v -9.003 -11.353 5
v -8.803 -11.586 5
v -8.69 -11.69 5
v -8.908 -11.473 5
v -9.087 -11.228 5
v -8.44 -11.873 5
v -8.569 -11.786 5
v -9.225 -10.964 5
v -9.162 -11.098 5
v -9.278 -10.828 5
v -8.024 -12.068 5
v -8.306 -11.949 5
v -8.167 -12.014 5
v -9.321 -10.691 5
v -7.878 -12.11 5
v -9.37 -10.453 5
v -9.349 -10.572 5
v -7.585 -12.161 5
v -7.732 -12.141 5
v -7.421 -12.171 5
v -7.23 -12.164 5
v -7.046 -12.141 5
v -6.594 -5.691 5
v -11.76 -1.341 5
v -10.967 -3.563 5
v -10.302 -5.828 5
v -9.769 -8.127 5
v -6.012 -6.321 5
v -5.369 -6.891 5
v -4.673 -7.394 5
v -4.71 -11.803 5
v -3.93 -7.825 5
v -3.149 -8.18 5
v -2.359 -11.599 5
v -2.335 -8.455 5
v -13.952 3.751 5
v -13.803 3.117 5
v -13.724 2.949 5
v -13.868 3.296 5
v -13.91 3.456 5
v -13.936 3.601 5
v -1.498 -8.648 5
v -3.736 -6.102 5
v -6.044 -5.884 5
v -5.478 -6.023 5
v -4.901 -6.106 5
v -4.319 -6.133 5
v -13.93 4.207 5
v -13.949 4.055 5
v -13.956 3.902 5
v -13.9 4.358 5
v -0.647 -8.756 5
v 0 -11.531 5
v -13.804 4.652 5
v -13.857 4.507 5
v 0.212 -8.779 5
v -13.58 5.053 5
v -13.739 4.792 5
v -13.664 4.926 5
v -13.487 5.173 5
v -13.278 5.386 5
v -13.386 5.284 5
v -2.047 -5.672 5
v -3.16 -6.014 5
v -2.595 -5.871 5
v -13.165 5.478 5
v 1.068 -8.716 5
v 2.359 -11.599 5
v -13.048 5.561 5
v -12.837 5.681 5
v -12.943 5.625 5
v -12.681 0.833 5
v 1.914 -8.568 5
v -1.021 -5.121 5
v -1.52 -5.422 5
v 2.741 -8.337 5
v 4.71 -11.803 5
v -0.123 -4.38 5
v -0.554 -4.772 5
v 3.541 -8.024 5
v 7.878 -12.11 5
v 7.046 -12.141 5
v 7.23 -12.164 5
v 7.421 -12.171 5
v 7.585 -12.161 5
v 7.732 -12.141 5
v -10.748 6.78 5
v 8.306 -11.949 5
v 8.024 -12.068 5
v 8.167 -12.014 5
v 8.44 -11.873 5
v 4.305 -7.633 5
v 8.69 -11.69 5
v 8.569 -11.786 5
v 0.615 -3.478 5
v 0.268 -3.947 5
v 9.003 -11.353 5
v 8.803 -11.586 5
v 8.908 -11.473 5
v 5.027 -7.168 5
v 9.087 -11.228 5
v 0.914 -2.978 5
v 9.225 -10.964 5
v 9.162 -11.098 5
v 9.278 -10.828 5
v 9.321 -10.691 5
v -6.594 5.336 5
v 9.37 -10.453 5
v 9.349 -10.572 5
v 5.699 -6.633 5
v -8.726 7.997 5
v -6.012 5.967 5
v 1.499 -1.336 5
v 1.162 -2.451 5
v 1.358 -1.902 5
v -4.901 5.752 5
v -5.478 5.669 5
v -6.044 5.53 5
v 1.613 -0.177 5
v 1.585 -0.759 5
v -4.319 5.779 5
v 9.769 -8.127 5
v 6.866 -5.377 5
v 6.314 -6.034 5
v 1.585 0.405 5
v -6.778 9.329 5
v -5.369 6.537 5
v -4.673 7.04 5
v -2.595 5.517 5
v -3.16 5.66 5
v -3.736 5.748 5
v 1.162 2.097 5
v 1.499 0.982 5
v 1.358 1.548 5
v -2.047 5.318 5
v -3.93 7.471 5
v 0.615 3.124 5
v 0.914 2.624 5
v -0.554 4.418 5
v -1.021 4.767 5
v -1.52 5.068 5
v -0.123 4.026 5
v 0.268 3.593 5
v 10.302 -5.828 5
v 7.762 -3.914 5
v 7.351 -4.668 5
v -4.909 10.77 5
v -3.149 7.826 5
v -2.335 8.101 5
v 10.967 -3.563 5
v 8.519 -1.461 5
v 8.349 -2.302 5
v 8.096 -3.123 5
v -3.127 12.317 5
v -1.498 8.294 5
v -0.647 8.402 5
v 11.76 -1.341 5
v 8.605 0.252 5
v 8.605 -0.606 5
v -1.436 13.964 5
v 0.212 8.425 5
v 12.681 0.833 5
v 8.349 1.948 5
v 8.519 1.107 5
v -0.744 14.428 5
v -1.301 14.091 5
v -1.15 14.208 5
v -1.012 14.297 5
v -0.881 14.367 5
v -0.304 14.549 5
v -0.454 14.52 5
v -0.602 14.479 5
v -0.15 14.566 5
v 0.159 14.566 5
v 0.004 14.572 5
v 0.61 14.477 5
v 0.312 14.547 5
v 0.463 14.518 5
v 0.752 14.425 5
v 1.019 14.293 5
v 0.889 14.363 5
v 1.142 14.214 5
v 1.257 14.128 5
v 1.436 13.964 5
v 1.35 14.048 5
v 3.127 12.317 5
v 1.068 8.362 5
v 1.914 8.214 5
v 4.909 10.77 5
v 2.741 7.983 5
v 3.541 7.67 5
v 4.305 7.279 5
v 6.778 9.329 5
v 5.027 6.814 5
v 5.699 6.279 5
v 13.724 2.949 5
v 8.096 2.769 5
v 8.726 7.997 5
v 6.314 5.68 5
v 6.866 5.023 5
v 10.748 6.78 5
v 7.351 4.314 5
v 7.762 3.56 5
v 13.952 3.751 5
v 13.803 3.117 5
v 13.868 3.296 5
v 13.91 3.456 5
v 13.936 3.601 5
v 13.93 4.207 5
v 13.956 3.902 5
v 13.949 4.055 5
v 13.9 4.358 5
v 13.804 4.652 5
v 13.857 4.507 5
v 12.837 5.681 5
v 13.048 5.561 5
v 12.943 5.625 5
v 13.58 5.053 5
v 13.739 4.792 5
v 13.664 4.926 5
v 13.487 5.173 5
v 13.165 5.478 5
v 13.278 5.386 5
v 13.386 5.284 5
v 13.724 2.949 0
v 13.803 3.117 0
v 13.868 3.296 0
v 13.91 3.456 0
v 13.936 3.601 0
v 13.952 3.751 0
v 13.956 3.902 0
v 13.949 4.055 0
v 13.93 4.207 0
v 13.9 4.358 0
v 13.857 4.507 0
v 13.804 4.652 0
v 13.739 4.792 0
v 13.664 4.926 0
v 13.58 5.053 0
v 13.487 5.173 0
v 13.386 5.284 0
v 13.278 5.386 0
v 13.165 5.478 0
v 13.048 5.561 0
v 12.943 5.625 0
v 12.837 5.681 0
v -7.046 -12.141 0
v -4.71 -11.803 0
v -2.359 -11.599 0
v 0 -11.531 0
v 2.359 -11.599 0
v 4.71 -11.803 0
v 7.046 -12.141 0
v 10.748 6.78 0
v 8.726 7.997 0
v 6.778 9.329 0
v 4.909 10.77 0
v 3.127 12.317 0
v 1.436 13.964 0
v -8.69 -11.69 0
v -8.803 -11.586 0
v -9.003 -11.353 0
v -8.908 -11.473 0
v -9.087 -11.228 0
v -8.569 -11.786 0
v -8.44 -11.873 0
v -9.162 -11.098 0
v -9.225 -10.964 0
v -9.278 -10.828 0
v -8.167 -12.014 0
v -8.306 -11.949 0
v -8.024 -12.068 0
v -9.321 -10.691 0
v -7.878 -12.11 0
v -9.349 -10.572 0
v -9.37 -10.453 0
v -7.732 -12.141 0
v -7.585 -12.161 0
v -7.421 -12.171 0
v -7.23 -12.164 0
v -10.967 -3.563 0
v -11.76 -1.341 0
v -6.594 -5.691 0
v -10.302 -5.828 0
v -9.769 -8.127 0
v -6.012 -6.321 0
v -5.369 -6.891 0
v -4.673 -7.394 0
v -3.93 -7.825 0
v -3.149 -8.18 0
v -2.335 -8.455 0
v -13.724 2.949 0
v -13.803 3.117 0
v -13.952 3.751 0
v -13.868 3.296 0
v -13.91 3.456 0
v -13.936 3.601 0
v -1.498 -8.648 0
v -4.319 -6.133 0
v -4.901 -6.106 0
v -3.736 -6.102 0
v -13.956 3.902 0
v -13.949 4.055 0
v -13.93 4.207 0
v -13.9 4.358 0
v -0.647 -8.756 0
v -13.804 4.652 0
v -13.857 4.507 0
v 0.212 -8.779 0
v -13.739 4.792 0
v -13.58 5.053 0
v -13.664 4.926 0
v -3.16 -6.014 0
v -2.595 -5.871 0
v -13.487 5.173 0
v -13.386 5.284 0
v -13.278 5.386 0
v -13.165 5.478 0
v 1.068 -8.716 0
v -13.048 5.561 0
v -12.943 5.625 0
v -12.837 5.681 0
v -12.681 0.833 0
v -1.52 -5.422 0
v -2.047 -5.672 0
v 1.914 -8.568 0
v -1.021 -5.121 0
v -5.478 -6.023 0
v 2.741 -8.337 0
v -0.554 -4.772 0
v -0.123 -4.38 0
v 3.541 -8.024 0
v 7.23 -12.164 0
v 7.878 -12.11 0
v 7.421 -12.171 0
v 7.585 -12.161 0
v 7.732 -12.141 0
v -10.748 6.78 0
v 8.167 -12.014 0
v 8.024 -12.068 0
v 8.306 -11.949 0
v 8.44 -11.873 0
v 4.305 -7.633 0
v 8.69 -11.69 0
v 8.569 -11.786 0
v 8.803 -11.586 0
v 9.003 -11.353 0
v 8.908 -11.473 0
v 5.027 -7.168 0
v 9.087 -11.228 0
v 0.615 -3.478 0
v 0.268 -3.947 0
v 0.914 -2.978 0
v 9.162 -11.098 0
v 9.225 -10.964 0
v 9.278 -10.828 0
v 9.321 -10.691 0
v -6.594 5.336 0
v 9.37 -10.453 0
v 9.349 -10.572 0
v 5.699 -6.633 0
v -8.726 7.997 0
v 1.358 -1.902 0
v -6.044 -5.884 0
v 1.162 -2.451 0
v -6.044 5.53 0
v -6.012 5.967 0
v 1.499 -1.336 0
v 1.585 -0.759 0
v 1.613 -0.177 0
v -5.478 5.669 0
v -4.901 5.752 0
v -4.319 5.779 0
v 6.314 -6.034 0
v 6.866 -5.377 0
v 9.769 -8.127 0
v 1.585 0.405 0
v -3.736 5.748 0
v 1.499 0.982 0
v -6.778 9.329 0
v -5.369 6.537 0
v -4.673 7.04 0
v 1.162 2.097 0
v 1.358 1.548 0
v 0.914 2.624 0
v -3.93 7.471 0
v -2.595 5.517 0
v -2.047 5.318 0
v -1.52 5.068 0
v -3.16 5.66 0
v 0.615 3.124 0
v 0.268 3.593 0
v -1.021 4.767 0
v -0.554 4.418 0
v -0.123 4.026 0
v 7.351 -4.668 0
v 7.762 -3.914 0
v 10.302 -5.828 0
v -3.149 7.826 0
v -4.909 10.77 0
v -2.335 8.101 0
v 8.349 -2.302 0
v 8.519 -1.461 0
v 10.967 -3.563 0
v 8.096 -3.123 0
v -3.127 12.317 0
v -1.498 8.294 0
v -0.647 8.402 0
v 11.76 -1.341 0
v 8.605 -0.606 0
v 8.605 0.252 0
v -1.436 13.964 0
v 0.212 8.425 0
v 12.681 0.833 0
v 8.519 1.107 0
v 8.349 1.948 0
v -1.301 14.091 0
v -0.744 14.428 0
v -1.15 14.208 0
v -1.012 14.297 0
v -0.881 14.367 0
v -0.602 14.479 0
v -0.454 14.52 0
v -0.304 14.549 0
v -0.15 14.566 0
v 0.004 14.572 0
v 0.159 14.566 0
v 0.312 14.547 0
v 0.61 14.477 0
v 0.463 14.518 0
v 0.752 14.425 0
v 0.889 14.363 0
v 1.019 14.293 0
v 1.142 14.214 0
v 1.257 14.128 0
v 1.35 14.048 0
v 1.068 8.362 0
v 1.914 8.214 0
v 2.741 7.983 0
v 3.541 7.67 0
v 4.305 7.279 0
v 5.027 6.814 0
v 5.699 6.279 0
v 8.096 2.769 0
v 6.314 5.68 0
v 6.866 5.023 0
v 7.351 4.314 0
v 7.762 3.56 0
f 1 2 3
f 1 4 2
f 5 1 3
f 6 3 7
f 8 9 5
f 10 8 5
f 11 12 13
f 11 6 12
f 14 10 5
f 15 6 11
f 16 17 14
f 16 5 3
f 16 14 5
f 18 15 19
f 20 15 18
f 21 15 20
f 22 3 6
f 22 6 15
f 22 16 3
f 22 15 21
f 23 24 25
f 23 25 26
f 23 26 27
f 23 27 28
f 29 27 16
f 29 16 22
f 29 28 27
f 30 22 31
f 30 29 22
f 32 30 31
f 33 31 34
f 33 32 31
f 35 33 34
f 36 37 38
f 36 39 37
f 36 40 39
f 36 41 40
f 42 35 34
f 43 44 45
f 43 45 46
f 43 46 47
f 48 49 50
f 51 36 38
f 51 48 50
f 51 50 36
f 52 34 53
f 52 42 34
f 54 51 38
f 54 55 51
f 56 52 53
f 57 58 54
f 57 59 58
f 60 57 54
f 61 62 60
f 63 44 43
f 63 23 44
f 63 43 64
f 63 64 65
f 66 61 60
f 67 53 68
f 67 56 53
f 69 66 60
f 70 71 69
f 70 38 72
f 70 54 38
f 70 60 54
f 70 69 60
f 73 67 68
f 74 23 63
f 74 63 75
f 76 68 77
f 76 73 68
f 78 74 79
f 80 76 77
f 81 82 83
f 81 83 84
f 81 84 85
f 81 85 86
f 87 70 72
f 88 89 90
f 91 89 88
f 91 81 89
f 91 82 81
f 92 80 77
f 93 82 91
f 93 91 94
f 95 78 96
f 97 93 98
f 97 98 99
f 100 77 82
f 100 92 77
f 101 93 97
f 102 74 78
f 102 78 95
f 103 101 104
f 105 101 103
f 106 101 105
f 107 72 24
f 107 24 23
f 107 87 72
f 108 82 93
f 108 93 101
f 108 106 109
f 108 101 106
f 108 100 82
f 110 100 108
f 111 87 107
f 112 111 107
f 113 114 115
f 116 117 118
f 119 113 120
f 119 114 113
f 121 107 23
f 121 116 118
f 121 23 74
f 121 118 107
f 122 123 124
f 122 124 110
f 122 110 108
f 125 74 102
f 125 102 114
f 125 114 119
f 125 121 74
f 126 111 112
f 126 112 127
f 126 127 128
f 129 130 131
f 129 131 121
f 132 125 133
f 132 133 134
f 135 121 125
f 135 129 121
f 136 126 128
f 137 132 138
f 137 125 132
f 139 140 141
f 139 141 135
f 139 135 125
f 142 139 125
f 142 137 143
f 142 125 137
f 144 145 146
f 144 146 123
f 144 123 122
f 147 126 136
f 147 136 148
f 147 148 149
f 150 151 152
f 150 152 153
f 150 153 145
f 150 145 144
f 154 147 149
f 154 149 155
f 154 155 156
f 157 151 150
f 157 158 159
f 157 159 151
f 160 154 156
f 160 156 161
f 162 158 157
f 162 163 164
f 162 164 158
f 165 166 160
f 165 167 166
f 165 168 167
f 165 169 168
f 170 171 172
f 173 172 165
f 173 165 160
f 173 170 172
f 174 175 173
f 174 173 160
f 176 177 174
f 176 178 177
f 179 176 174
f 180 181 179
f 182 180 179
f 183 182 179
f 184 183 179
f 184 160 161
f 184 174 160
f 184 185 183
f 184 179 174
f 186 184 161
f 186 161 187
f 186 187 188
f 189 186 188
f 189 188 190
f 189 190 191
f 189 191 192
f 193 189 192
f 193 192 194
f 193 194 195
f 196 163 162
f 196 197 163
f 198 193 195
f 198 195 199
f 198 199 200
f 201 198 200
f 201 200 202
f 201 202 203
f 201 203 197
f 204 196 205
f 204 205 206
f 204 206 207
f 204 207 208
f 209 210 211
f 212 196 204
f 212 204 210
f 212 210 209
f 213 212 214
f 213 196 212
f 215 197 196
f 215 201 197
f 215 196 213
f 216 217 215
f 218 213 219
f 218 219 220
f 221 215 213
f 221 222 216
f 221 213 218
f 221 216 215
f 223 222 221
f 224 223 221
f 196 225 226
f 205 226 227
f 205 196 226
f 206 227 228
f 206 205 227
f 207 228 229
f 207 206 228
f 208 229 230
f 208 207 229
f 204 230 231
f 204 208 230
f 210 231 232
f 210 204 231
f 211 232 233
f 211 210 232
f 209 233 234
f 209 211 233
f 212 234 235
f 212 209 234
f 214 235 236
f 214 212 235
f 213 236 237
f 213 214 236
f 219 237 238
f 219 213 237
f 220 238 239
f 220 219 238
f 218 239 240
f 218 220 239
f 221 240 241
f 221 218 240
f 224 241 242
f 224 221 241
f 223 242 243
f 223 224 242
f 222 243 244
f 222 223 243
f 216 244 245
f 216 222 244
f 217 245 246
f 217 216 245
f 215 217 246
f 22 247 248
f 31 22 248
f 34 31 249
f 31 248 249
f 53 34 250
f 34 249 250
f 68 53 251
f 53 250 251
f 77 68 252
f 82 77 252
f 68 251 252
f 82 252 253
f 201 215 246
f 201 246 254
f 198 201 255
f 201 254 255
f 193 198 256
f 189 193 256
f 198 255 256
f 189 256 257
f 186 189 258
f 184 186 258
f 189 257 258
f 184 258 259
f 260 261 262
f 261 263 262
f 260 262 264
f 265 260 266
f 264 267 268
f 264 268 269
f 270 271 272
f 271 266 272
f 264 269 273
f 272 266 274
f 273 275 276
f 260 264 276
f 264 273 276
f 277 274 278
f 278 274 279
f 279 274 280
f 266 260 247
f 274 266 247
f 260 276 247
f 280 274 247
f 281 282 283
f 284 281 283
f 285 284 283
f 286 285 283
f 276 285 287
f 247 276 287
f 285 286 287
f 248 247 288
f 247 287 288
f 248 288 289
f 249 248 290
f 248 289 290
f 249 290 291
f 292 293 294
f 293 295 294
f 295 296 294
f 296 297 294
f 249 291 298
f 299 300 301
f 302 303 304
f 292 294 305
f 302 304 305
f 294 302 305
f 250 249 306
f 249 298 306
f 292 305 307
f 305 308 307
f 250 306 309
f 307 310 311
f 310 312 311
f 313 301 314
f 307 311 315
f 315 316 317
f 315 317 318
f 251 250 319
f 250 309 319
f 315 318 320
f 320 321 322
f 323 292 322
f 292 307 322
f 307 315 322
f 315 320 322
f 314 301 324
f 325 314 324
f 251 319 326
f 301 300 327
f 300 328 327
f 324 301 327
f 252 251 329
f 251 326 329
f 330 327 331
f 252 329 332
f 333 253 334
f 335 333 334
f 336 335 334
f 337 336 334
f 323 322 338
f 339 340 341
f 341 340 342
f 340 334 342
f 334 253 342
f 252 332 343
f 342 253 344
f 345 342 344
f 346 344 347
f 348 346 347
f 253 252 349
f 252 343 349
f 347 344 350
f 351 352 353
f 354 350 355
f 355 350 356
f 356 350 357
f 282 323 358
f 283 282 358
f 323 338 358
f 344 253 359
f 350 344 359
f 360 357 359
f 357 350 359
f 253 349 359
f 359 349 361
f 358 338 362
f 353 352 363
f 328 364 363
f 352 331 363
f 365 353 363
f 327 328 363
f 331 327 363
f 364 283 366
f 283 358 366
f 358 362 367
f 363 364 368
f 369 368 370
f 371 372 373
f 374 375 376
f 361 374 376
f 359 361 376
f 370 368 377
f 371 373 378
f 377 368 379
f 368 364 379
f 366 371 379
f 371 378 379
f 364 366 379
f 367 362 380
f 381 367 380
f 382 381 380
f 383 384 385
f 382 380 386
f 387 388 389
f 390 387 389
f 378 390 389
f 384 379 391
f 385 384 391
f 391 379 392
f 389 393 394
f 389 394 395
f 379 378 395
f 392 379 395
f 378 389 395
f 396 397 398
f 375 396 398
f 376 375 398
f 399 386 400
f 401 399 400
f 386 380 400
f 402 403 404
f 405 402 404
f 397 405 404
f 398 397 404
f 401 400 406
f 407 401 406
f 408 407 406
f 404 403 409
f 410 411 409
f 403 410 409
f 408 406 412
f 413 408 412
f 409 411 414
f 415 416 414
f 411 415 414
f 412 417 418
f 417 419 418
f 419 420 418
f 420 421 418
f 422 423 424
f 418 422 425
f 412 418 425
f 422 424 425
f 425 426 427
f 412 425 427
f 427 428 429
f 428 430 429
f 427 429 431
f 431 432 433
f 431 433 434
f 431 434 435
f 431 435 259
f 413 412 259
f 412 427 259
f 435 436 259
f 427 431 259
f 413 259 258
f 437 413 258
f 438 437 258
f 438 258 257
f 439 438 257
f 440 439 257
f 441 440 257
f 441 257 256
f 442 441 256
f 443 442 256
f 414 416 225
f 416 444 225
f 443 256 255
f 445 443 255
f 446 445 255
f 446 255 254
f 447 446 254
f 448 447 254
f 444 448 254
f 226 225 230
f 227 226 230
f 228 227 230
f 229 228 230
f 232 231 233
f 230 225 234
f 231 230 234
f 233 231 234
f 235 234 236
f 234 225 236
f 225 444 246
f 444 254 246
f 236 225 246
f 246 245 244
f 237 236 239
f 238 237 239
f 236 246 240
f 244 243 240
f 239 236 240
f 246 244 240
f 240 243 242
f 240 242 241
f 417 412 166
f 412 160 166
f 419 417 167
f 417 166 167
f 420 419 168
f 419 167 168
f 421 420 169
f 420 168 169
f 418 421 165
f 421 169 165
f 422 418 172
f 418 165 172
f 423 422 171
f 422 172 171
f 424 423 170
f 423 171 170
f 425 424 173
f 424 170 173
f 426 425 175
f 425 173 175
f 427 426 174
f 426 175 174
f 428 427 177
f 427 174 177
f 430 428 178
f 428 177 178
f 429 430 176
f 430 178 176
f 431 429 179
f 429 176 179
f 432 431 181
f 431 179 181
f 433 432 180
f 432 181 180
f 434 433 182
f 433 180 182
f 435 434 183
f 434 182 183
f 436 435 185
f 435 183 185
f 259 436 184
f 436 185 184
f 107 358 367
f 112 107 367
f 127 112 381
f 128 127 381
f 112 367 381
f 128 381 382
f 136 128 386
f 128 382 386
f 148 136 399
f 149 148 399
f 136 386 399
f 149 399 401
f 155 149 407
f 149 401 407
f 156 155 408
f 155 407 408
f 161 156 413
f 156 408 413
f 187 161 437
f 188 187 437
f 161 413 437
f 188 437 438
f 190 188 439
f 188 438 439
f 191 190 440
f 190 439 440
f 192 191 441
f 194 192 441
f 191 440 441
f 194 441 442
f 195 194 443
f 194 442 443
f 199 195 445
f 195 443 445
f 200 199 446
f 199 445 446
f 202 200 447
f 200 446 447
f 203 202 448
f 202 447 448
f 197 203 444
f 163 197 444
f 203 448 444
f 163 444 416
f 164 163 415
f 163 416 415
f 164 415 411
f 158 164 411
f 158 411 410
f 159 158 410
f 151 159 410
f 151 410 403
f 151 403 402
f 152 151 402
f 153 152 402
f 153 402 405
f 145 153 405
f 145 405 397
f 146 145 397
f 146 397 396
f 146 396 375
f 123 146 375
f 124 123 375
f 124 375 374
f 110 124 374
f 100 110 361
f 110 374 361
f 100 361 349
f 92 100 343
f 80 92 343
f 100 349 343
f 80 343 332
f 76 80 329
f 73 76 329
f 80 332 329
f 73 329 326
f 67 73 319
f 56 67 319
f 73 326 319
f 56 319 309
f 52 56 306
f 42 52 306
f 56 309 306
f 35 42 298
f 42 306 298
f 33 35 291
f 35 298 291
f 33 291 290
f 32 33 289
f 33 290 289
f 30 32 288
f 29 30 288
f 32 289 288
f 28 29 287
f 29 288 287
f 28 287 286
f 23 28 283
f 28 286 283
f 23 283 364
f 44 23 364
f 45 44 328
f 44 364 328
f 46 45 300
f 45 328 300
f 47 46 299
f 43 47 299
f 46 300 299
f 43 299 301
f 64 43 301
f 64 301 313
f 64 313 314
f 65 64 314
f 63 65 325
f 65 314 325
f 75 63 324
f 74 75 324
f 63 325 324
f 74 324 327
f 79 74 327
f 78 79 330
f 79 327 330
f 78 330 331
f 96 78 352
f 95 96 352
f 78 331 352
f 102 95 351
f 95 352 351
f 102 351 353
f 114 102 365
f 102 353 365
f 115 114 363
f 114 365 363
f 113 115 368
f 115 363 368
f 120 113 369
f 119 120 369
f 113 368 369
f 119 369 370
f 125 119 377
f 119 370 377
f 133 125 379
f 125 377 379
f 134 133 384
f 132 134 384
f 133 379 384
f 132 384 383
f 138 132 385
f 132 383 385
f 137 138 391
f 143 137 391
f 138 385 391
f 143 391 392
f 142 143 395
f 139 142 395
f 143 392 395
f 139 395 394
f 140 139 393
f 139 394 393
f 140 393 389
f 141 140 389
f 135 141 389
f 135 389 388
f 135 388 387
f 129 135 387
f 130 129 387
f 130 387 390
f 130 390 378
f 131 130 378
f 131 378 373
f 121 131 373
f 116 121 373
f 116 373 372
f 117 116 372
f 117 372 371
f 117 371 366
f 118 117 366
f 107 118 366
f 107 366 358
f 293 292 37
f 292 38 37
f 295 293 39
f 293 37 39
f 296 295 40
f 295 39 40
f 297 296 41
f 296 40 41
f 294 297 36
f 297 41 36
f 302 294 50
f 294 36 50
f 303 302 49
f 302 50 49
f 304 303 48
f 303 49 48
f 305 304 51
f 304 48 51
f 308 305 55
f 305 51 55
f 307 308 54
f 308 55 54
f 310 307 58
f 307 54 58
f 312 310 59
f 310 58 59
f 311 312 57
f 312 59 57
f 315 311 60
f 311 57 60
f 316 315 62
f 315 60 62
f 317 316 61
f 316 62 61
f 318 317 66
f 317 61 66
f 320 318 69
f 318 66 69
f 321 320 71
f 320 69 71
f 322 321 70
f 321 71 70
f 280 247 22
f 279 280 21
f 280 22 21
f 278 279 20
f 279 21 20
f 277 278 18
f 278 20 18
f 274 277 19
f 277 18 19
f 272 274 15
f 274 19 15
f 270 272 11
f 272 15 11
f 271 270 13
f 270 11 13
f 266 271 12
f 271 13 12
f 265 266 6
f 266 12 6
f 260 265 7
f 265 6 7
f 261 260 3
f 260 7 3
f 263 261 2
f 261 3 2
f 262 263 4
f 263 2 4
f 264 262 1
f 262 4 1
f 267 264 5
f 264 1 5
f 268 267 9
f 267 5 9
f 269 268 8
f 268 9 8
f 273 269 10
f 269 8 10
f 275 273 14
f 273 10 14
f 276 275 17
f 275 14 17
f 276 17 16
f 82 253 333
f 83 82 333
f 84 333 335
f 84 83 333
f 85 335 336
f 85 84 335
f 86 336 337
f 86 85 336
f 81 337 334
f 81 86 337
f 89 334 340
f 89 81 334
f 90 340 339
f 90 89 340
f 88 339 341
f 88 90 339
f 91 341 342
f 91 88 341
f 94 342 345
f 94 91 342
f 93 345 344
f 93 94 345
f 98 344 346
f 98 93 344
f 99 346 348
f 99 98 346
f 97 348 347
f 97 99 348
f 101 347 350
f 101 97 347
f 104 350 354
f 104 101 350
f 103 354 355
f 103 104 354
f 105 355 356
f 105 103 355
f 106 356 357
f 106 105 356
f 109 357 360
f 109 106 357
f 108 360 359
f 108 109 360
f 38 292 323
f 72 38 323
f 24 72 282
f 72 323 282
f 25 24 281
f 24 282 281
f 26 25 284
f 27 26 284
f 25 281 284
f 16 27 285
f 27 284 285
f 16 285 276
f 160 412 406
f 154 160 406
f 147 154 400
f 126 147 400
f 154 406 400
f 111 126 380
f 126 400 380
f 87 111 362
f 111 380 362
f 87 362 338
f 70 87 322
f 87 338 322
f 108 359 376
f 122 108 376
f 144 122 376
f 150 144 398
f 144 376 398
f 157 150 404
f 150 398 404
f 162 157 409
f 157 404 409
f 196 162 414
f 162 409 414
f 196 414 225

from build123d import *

# Parameters (mm, degrees)
F1_DEPTH = 5
F2_R     = 2


with BuildPart() as f1:
    # F0 (on Top) → F1 (new body)
    with BuildSketch(Plane.XY):
        with BuildLine():
            ThreePointArc((-9.125, -12.559485), (0, -11.531155), (9.125, -12.559485))
            ThreePointArc((9.125, -12.559485), (10.96678, -3.563323), (14.76456, 4.797296))
            ThreePointArc((14.76456, 4.797296), (6.777843, 9.3289), (0, 15.524377))
            ThreePointArc((0, 15.524377), (-6.777843, 9.3289), (-14.76456, 4.797296))
            ThreePointArc((-14.76456, 4.797296), (-10.96678, -3.563323), (-9.125, -12.559485))
        make_face()
        with BuildLine():
            ThreePointArc((-6.594019, 5.336478), (8.615573, -0.177029), (-6.594019, -5.690536))
            ThreePointArc((-6.594019, -5.690536), (1.613356, -0.177029), (-6.594019, 5.336478))
        make_face(mode=Mode.SUBTRACT)
    extrude(amount=F1_DEPTH)

    # F2
    f2_edges = [f1.edges().sort_by_distance(p)[0] for p in [
        (-14.76456, 4.797296, 2.5),
        (0, 15.524377, 2.5),
        (14.76456, 4.797296, 2.5),
        (9.125, -12.559485, 2.5),
        (-9.125, -12.559485, 2.5),
    ]]
    fillet(f2_edges, radius=F2_R)


solid = f1.part
